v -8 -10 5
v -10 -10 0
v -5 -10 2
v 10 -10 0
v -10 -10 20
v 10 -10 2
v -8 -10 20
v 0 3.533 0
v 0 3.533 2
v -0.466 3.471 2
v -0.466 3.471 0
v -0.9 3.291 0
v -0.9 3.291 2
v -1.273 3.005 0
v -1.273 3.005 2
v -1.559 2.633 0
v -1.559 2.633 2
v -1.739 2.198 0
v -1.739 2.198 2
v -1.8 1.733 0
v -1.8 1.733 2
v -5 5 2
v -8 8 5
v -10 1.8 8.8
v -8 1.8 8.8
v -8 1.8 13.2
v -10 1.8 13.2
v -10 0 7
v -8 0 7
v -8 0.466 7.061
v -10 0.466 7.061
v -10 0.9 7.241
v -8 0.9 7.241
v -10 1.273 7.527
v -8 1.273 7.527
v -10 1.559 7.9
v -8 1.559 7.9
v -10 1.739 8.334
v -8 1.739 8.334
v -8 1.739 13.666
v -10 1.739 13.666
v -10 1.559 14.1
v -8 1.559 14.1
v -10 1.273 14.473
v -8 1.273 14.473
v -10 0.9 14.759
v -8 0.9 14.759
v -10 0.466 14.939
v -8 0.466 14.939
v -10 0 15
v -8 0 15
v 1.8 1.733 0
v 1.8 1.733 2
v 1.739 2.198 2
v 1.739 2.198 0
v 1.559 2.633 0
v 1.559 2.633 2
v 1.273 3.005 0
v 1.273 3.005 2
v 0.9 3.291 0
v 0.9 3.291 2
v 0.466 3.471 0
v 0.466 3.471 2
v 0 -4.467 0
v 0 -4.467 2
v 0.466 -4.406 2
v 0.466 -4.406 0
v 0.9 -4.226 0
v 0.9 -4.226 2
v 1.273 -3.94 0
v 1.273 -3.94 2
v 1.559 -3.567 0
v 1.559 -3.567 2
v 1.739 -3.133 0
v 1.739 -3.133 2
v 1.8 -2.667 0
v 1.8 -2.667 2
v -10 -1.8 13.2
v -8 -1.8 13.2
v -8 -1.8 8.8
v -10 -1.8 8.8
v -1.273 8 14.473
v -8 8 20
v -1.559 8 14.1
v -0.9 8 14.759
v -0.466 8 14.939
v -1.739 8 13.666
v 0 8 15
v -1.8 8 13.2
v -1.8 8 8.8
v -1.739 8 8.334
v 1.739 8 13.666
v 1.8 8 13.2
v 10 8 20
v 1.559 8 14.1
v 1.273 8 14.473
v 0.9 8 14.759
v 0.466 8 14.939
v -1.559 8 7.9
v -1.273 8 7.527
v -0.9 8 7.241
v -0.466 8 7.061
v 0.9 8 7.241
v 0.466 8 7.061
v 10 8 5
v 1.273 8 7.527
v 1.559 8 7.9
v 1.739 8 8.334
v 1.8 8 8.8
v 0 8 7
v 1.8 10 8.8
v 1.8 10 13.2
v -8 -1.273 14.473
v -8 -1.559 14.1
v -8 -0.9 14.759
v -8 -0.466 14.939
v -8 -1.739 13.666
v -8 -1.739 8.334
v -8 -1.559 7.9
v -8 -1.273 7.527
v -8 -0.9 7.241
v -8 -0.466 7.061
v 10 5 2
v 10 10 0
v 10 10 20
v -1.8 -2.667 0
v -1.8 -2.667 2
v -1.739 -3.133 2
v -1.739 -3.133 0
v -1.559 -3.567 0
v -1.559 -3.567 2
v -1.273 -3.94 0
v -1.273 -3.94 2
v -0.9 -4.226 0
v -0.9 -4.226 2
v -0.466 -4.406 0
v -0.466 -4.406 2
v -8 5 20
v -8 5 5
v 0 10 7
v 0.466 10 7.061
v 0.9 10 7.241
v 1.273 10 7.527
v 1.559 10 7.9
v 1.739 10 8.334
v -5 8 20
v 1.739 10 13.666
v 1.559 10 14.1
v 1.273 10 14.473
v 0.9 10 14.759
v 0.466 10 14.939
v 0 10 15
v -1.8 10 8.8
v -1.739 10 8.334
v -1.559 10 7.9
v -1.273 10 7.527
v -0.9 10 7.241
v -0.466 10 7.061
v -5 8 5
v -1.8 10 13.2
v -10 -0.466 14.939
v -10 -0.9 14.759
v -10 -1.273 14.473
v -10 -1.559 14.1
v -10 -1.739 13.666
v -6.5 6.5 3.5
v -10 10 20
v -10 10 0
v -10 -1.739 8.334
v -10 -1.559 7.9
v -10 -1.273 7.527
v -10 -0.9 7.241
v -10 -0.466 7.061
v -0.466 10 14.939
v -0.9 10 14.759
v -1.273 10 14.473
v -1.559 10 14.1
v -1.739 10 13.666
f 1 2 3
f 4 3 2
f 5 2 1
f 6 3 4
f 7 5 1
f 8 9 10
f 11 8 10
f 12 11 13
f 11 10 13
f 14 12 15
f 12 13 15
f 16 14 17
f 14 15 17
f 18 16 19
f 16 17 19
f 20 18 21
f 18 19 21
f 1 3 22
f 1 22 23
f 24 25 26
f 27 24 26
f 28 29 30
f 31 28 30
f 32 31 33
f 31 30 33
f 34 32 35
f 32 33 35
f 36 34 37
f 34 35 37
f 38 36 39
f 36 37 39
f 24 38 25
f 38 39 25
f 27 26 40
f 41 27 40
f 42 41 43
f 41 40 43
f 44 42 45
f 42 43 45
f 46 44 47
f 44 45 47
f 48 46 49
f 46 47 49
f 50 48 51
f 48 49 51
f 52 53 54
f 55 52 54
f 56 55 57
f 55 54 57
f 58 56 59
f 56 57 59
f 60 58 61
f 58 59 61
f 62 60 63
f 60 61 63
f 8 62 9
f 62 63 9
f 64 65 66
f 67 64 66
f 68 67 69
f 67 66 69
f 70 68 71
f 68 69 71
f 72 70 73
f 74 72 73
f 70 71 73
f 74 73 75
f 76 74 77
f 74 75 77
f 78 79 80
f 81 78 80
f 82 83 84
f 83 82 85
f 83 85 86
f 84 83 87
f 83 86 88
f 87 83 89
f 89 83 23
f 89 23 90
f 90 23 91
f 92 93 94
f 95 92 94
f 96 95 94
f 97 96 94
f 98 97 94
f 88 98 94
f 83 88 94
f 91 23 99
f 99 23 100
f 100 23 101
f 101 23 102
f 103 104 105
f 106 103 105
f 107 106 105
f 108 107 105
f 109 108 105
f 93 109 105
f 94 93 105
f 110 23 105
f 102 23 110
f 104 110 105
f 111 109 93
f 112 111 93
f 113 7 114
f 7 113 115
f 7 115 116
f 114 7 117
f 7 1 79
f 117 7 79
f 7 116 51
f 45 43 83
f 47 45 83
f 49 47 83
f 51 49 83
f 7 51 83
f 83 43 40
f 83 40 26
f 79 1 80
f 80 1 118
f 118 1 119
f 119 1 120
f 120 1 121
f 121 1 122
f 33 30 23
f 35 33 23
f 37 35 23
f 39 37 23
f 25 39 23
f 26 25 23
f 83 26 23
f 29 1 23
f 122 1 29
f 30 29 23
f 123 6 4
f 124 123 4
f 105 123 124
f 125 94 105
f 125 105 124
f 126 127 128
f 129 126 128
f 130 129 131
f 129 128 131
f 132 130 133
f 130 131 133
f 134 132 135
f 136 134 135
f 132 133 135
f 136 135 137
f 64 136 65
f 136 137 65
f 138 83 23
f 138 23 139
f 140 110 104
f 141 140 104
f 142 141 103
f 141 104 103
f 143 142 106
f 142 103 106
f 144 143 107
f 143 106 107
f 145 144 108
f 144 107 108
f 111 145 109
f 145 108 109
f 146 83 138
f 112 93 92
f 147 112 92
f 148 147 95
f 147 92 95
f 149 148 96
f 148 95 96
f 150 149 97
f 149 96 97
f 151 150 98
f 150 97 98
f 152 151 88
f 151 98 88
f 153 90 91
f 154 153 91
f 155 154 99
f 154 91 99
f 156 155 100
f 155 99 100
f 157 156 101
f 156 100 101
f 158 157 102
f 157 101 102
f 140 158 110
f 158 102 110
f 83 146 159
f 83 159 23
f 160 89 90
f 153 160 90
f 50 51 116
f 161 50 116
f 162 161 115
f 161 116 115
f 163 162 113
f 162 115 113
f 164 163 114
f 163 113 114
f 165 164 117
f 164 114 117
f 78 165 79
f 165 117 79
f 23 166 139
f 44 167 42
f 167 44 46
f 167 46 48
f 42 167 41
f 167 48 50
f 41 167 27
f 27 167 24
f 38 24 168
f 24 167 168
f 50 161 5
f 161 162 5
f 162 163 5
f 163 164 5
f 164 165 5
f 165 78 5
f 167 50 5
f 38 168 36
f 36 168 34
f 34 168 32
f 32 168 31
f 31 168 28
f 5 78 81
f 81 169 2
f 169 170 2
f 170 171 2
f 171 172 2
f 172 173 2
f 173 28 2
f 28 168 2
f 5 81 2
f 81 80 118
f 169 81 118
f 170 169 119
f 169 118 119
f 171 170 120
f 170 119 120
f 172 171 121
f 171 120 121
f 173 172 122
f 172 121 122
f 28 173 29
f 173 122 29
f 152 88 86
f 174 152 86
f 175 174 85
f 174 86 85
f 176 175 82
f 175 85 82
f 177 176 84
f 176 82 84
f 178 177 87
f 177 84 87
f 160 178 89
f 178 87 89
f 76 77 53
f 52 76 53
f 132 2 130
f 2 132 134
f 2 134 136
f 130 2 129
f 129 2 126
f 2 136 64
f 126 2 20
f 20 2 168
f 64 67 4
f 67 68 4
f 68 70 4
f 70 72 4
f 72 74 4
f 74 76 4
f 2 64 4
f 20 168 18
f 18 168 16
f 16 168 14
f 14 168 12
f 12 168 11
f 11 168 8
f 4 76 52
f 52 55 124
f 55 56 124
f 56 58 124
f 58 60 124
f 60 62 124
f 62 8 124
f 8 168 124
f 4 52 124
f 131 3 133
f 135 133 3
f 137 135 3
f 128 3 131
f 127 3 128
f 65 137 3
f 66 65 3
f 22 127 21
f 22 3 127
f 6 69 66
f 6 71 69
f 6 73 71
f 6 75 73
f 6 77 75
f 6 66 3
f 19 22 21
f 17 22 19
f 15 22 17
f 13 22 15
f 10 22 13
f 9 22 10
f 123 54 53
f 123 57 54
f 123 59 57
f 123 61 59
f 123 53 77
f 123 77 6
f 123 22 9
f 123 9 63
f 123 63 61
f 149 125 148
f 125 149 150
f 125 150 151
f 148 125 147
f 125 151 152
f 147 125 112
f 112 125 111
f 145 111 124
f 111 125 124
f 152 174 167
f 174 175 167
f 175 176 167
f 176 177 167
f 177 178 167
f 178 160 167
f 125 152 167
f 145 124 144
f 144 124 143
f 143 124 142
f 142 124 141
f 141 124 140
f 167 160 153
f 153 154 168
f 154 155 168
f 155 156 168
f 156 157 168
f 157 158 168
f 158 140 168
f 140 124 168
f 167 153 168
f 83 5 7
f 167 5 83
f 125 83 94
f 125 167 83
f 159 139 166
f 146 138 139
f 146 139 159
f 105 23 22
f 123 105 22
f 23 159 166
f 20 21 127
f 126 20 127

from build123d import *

# Parameters (mm, degrees)
F0_W      = 20
F0_H      = 20
F1_DEPTH  = 2
F3_DEPTH  = 18
F7_DEPTH  = 2.001
F8_DEPTH  = 2.001
F9_DEPTH  = 2.001
F11_DEPTH = 18


with BuildPart() as f1:
    # F0 (on Top) → F1 (new body)
    with BuildSketch(Plane.XY):
        Rectangle(F0_W, F0_H)
    extrude(amount=F1_DEPTH)

    # F2 (on face) → F3 (join)
    with BuildSketch(Plane.XY.offset(2)):
        Polygon((-10, -10), (-8, -10), (-8, 8), (10, 8), (10, 10), (-10, 10), align=None)
    extrude(amount=F3_DEPTH)

    # F5 (on face) → F7 (cut, through all)
    with BuildSketch(Plane.YZ.offset(-8)):
        with BuildLine():
            ThreePointArc((0, 7), (1.2727922061, 7.5272077939), (1.8, 8.8))
            Line((1.8, 8.8), (1.8, 13.2))
            ThreePointArc((1.8, 13.2), (1.2727922061, 14.4727922061), (0, 15))
            ThreePointArc((0, 15), (-1.2727922061, 14.4727922061), (-1.8, 13.2))
            Line((-1.8, 13.2), (-1.8, 8.8))
            ThreePointArc((-1.8, 8.8), (-1.2727922061, 7.5272077939), (0, 7))
        make_face()
    extrude(amount=-F7_DEPTH, mode=Mode.SUBTRACT)

    # F6 (on face) → F8 (cut, through all)
    with BuildSketch(Plane.XZ.offset(-8)):
        with BuildLine():
            ThreePointArc((0, 7), (1.2727922061, 7.5272077939), (1.8, 8.8))
            Line((1.8, 8.8), (1.8, 13.2))
            ThreePointArc((1.8, 13.2), (1.2727922061, 14.4727922061), (0, 15))
            ThreePointArc((0, 15), (-1.2727922061, 14.4727922061), (-1.8, 13.2))
            Line((-1.8, 13.2), (-1.8, 8.8))
            ThreePointArc((-1.8, 8.8), (-1.2727922061, 7.5272077939), (0, 7))
        make_face()
    extrude(amount=-F8_DEPTH, mode=Mode.SUBTRACT)

    # F4 (on face) → F9 (cut, through all)
    with BuildSketch(Plane.XY.offset(2)):
        with BuildLine():
            ThreePointArc((0, -4.4674180151), (1.2727922061, -3.9402102213), (1.8, -2.6674180151))
            Line((1.8, -2.6674180151), (1.8, 1.7325819849))
            ThreePointArc((1.8, 1.7325819849), (1.2727922061, 3.005374191), (0, 3.5325819849))
            ThreePointArc((0, 3.5325819849), (-1.2727922061, 3.005374191), (-1.8, 1.7325819849))
            Line((-1.8, 1.7325819849), (-1.8, -2.6674180151))
            ThreePointArc((-1.8, -2.6674180151), (-1.2727922061, -3.9402102213), (0, -4.4674180151))
        make_face()
    extrude(amount=-F9_DEPTH, mode=Mode.SUBTRACT)

    # F10 (on face) → F11 (join, through all)
    with BuildSketch(Plane.YZ.offset(10)):
        Polygon((5, 2), (8, 2), (8, 5), align=None)
    extrude(amount=-F11_DEPTH)

    # F12 (on face) → F13 (join, up to the next surface of F1)
    with BuildSketch(Plane.XZ.offset(10)):
        Polygon((-8, 5), (-8, 2), (-5, 2), align=None)
    extrude(until=Until.NEXT, dir=(0, 1, 0))


with BuildPart() as f15:
    # F14 (on face) → F15 (new body, up to the next surface of F1)
    with BuildSketch(Plane.XY.offset(20)):
        Polygon((-5, 8), (-8, 8), (-8, 5), align=None)
    extrude(until=Until.NEXT, target=f1.part, dir=(0, 0, -1))


solid = Compound([f1.part, f15.part])
